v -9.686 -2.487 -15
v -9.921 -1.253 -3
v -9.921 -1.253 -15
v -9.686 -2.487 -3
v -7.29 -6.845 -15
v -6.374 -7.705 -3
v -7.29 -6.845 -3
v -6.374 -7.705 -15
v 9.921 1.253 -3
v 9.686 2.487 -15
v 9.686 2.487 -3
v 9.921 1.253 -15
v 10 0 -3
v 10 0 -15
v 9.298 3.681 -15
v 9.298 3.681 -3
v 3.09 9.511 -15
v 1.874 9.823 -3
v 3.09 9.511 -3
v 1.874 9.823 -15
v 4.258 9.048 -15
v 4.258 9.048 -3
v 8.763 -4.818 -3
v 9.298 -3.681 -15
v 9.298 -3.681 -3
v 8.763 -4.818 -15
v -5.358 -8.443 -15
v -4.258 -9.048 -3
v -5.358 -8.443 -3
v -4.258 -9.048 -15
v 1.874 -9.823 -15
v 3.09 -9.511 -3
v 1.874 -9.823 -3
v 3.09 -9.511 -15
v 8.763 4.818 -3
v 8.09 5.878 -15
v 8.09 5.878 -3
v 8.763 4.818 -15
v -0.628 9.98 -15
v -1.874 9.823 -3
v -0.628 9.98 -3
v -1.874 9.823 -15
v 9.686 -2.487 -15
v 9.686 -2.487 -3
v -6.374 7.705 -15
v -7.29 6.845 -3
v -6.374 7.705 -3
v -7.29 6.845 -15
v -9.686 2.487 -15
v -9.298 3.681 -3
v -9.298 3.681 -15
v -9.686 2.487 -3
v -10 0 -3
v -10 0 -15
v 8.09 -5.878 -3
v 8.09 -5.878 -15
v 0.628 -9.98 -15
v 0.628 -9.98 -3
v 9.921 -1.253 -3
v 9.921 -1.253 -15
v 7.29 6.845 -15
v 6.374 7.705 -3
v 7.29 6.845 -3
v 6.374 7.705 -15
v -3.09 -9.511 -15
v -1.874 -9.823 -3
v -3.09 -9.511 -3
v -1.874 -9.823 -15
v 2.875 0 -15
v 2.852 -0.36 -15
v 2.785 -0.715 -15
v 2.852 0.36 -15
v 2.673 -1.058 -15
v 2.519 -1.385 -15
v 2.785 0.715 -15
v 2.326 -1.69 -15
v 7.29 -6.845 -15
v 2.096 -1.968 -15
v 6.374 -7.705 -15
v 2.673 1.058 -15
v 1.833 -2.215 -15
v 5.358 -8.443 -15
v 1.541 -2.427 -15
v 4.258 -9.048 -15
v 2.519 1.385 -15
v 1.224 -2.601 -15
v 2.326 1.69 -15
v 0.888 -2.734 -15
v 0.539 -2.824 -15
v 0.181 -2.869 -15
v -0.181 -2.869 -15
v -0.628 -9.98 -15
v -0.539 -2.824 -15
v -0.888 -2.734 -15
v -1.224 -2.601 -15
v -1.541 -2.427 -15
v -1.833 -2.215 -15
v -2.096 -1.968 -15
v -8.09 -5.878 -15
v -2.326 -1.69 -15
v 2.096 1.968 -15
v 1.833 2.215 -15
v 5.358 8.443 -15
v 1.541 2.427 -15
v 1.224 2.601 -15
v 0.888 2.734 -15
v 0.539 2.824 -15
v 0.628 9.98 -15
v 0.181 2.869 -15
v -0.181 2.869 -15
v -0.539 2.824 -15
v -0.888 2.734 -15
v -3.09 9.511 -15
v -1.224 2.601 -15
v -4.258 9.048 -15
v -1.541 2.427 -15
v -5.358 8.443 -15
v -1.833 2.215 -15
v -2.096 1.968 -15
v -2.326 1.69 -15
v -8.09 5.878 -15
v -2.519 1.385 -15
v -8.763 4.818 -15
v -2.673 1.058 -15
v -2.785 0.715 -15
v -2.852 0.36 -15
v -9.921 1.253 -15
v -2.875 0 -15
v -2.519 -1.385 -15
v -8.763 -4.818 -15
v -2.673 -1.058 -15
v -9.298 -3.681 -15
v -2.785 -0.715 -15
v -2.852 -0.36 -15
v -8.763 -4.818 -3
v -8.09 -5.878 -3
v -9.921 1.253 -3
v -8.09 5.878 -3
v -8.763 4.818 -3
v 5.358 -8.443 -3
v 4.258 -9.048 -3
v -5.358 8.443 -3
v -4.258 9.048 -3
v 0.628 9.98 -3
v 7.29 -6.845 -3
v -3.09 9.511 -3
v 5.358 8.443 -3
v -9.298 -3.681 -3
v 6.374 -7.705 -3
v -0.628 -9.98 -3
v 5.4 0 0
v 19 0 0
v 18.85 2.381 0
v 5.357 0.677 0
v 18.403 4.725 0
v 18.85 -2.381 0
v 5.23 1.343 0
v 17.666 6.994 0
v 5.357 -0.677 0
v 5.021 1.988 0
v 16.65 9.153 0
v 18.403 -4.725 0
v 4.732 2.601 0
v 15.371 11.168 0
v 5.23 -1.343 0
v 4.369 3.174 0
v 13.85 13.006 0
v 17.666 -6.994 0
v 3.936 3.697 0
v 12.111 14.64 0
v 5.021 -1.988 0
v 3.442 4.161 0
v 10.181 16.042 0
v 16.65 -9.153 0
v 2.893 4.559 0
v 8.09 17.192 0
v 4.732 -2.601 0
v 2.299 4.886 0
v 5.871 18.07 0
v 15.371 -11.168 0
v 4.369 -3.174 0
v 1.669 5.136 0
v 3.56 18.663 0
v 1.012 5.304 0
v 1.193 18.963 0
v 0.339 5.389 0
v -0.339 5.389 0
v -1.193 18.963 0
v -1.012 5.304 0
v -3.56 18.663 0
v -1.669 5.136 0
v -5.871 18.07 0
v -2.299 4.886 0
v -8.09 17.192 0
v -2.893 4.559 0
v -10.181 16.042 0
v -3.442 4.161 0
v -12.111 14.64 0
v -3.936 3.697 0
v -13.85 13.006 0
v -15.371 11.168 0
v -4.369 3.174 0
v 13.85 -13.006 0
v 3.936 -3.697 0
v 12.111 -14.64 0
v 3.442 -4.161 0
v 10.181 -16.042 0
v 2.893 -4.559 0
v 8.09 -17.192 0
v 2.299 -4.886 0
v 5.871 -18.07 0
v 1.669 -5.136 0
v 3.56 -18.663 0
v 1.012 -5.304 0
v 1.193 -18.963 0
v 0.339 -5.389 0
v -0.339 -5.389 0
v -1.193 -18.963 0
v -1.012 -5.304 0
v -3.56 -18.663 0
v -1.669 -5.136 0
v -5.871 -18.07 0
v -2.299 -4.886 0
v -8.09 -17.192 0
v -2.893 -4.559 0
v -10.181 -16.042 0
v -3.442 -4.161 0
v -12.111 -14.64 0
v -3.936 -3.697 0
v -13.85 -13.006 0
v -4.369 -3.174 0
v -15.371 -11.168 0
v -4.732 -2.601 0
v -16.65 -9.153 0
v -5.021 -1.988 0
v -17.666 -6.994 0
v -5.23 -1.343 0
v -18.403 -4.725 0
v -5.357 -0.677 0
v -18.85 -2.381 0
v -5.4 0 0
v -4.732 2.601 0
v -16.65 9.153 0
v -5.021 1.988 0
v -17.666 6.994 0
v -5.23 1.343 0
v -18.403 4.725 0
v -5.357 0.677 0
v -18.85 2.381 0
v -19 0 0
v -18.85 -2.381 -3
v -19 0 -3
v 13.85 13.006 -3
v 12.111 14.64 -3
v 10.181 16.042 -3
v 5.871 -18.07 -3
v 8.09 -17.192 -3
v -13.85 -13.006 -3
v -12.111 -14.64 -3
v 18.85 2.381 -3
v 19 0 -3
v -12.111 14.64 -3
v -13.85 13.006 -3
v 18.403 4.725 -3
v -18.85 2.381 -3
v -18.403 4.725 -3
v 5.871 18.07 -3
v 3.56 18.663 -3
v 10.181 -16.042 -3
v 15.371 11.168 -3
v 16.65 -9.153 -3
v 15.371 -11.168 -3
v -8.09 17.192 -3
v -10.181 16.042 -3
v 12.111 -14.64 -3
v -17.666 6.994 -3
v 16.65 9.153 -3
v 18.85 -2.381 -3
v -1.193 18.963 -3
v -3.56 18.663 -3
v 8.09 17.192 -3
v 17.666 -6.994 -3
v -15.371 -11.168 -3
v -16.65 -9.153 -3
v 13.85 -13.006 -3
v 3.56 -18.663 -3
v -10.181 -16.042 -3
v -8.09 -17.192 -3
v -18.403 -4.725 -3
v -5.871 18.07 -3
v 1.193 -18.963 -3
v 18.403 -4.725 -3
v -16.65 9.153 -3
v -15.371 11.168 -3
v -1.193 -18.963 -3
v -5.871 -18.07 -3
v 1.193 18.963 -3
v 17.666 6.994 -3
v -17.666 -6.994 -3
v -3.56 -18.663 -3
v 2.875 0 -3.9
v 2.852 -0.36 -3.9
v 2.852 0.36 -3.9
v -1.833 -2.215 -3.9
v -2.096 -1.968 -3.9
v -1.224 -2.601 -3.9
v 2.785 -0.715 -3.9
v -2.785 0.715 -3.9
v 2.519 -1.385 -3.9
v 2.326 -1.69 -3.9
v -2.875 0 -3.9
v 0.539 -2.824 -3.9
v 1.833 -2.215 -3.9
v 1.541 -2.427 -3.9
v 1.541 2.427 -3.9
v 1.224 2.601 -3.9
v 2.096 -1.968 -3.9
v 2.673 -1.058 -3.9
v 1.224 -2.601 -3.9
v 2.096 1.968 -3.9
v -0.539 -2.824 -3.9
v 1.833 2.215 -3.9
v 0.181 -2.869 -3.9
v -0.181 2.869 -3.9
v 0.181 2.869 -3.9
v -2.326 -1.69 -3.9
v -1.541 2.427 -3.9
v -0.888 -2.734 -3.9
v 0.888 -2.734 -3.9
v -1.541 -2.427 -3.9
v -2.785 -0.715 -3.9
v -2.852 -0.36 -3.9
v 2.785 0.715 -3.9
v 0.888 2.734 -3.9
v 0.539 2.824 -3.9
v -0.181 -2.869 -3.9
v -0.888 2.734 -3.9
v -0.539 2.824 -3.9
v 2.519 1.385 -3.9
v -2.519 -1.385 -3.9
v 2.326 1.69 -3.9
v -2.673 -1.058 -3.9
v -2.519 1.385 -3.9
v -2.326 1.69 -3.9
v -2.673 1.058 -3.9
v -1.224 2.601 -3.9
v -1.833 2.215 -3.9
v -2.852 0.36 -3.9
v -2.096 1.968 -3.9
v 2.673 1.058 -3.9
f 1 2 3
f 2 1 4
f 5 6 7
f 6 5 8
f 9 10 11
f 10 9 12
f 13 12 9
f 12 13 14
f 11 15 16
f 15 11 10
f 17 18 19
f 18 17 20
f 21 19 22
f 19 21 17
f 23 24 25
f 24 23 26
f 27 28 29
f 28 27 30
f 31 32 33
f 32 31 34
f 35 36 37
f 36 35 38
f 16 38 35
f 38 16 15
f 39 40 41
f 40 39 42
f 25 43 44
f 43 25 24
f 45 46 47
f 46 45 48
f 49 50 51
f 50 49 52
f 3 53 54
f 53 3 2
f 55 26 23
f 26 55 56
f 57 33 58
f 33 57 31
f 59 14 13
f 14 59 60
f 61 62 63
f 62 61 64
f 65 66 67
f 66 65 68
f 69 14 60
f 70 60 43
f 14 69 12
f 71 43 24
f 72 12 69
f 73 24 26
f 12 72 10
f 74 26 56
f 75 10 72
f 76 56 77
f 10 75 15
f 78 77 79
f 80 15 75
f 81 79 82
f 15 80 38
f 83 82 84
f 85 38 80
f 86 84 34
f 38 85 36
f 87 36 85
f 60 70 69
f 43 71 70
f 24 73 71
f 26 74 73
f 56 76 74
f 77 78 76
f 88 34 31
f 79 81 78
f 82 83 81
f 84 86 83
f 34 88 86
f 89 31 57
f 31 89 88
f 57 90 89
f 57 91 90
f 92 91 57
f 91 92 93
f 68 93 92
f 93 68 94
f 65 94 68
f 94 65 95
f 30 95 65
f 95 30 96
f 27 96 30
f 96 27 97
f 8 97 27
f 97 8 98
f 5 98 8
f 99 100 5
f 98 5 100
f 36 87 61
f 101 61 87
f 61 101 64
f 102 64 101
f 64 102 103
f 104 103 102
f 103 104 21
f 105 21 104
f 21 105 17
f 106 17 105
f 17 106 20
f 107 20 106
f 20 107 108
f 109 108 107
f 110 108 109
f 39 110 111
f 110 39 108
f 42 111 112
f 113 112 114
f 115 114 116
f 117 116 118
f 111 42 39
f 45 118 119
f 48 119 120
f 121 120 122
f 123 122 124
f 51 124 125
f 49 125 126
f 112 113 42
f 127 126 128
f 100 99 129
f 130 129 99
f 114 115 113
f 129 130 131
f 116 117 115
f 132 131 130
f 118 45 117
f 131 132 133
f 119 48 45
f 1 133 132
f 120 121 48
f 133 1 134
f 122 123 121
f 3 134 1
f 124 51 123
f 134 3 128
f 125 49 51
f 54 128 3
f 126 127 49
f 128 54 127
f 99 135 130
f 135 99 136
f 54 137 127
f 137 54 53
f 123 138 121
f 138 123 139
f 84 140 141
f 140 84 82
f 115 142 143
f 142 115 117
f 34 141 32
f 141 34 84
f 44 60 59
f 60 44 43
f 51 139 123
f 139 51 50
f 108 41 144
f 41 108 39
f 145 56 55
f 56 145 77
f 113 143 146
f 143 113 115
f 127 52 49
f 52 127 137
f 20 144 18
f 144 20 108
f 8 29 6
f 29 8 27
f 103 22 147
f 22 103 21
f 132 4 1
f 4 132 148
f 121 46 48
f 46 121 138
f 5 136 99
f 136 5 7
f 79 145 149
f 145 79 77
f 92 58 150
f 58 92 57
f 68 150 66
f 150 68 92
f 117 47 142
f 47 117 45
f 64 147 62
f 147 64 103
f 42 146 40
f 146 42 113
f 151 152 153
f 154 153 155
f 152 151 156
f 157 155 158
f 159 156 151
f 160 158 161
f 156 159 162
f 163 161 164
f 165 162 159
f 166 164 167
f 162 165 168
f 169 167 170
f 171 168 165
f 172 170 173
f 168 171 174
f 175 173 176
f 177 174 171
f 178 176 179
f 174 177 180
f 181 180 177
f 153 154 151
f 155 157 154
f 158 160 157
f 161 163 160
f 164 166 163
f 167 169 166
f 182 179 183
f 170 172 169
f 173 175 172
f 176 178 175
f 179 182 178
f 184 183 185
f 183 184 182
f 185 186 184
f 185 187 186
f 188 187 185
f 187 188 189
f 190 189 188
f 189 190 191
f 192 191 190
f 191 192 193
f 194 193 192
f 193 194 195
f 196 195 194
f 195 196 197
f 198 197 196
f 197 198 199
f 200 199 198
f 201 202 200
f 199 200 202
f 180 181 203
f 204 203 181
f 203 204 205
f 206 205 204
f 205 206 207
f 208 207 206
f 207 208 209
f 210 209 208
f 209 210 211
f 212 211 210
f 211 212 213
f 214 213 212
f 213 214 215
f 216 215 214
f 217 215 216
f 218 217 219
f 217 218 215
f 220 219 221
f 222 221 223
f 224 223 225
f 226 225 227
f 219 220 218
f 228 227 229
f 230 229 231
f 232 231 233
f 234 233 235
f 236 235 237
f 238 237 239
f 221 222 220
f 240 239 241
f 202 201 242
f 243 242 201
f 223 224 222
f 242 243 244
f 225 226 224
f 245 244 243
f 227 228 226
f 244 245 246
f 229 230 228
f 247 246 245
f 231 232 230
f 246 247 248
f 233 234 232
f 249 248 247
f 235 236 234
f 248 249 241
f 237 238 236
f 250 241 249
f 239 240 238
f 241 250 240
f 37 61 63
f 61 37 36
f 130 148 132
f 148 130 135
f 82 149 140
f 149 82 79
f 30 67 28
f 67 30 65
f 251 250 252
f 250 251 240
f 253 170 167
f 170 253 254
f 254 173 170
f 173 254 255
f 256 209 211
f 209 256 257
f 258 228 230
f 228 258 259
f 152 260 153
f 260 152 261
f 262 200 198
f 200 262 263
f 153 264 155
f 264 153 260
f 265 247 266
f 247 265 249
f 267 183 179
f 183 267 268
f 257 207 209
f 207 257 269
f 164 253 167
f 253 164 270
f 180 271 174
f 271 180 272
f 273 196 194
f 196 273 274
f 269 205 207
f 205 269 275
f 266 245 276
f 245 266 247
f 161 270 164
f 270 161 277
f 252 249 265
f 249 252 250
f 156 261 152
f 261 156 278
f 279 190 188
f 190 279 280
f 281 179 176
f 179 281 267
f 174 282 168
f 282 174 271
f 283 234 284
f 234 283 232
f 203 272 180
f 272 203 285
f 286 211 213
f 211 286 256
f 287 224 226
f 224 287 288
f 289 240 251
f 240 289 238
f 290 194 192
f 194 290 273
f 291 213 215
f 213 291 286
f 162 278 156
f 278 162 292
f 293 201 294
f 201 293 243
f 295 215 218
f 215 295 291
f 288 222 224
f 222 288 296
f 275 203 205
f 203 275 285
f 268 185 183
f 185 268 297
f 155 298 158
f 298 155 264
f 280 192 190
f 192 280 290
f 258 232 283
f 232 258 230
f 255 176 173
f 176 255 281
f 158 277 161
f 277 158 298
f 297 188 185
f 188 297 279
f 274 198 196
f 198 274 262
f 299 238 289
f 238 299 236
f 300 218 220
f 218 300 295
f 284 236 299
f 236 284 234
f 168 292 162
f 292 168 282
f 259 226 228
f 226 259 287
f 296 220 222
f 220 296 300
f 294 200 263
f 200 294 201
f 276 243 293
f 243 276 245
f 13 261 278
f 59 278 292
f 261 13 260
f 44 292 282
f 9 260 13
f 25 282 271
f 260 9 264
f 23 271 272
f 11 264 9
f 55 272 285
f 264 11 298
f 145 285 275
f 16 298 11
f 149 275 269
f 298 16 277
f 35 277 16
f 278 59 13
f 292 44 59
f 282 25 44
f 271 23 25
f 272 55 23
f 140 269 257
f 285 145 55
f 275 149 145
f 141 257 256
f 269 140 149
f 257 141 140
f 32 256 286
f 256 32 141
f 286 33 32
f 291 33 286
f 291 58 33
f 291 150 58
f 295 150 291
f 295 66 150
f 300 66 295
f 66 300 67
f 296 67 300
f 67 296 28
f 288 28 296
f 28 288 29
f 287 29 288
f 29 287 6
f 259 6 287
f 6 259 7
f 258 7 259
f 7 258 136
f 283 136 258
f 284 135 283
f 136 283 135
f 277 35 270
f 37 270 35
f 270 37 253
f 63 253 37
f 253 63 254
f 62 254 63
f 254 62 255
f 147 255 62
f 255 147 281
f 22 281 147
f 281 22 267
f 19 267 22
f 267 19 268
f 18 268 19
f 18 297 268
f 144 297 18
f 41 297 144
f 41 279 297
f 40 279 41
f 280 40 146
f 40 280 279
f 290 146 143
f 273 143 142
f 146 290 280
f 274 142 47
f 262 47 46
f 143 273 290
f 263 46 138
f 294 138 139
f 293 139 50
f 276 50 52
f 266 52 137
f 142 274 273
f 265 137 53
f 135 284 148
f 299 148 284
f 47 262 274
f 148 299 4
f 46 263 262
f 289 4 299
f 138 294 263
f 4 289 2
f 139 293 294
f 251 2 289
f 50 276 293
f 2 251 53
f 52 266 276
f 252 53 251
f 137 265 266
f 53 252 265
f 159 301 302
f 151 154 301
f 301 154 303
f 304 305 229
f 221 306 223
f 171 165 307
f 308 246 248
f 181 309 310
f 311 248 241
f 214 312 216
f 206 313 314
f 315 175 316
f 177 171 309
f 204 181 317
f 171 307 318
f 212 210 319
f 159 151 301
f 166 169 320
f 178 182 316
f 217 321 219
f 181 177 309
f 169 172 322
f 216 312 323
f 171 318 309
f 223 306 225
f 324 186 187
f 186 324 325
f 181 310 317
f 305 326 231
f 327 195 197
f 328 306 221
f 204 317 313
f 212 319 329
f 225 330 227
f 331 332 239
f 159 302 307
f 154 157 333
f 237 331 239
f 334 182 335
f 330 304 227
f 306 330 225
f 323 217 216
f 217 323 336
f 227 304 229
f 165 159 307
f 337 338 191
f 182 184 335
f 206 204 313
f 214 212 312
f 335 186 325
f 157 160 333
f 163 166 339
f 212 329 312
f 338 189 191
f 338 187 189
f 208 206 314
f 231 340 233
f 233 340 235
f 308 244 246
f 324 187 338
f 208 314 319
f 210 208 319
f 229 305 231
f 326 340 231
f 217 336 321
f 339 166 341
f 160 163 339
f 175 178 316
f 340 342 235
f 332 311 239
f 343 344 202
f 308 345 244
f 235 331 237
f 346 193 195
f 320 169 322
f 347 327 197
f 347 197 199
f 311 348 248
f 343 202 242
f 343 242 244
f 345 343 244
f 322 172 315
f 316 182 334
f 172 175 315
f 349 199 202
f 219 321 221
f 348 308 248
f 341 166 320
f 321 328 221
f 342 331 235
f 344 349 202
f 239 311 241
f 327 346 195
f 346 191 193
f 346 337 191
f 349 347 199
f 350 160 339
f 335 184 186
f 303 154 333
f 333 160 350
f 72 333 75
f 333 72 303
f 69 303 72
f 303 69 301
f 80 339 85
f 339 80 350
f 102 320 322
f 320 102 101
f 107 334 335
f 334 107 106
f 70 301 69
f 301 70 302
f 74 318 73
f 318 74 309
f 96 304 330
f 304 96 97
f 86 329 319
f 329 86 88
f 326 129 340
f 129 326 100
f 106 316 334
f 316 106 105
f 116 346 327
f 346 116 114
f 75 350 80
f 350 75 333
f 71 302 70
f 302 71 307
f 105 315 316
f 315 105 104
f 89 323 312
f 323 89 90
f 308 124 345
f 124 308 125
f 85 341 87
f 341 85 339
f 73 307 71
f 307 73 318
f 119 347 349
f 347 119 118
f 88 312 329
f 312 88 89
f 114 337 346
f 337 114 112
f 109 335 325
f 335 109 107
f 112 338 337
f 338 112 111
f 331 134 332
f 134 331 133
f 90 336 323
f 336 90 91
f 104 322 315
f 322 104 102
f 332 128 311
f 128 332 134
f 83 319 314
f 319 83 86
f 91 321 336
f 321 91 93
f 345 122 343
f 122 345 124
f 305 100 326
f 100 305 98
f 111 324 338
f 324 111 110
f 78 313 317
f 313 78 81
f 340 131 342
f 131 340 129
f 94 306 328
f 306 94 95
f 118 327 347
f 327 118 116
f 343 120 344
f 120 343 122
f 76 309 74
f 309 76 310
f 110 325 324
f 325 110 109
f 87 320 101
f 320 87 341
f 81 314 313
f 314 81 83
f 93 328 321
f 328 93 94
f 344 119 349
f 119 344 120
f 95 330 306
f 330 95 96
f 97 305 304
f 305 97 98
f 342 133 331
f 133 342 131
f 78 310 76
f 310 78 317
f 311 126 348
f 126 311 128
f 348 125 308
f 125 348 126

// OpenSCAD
$fn = 50;


difference() {
	union() {
		translate(v = [0, 0, -15.0000000000]) {
			cylinder(h = 15, r = 10.0000000000);
		}
		translate(v = [0, 0, -3.0000000000]) {
			cylinder(h = 3, r = 19.0000000000);
		}
	}
	union() {
		translate(v = [0, 0, 0]) {
			rotate(a = [0, 0, 0]) {
				difference() {
					union() {
						#translate(v = [0, 0, -15.0000000000]) {
							cylinder(h = 15, r = 2.6000000000);
						}
						#translate(v = [0, 0, -3.9000000000]) {
							cylinder(h = 3.9000000000, r1 = 2.8750000000, r2 = 5.4000000000);
						}
						#translate(v = [0, 0, -15.0000000000]) {
							cylinder(h = 15, r = 2.8750000000);
						}
						#translate(v = [0, 0, -15.0000000000]) {
							cylinder(h = 15, r = 2.6000000000);
						}
					}
					union();
				}
			}
		}
	}
}
